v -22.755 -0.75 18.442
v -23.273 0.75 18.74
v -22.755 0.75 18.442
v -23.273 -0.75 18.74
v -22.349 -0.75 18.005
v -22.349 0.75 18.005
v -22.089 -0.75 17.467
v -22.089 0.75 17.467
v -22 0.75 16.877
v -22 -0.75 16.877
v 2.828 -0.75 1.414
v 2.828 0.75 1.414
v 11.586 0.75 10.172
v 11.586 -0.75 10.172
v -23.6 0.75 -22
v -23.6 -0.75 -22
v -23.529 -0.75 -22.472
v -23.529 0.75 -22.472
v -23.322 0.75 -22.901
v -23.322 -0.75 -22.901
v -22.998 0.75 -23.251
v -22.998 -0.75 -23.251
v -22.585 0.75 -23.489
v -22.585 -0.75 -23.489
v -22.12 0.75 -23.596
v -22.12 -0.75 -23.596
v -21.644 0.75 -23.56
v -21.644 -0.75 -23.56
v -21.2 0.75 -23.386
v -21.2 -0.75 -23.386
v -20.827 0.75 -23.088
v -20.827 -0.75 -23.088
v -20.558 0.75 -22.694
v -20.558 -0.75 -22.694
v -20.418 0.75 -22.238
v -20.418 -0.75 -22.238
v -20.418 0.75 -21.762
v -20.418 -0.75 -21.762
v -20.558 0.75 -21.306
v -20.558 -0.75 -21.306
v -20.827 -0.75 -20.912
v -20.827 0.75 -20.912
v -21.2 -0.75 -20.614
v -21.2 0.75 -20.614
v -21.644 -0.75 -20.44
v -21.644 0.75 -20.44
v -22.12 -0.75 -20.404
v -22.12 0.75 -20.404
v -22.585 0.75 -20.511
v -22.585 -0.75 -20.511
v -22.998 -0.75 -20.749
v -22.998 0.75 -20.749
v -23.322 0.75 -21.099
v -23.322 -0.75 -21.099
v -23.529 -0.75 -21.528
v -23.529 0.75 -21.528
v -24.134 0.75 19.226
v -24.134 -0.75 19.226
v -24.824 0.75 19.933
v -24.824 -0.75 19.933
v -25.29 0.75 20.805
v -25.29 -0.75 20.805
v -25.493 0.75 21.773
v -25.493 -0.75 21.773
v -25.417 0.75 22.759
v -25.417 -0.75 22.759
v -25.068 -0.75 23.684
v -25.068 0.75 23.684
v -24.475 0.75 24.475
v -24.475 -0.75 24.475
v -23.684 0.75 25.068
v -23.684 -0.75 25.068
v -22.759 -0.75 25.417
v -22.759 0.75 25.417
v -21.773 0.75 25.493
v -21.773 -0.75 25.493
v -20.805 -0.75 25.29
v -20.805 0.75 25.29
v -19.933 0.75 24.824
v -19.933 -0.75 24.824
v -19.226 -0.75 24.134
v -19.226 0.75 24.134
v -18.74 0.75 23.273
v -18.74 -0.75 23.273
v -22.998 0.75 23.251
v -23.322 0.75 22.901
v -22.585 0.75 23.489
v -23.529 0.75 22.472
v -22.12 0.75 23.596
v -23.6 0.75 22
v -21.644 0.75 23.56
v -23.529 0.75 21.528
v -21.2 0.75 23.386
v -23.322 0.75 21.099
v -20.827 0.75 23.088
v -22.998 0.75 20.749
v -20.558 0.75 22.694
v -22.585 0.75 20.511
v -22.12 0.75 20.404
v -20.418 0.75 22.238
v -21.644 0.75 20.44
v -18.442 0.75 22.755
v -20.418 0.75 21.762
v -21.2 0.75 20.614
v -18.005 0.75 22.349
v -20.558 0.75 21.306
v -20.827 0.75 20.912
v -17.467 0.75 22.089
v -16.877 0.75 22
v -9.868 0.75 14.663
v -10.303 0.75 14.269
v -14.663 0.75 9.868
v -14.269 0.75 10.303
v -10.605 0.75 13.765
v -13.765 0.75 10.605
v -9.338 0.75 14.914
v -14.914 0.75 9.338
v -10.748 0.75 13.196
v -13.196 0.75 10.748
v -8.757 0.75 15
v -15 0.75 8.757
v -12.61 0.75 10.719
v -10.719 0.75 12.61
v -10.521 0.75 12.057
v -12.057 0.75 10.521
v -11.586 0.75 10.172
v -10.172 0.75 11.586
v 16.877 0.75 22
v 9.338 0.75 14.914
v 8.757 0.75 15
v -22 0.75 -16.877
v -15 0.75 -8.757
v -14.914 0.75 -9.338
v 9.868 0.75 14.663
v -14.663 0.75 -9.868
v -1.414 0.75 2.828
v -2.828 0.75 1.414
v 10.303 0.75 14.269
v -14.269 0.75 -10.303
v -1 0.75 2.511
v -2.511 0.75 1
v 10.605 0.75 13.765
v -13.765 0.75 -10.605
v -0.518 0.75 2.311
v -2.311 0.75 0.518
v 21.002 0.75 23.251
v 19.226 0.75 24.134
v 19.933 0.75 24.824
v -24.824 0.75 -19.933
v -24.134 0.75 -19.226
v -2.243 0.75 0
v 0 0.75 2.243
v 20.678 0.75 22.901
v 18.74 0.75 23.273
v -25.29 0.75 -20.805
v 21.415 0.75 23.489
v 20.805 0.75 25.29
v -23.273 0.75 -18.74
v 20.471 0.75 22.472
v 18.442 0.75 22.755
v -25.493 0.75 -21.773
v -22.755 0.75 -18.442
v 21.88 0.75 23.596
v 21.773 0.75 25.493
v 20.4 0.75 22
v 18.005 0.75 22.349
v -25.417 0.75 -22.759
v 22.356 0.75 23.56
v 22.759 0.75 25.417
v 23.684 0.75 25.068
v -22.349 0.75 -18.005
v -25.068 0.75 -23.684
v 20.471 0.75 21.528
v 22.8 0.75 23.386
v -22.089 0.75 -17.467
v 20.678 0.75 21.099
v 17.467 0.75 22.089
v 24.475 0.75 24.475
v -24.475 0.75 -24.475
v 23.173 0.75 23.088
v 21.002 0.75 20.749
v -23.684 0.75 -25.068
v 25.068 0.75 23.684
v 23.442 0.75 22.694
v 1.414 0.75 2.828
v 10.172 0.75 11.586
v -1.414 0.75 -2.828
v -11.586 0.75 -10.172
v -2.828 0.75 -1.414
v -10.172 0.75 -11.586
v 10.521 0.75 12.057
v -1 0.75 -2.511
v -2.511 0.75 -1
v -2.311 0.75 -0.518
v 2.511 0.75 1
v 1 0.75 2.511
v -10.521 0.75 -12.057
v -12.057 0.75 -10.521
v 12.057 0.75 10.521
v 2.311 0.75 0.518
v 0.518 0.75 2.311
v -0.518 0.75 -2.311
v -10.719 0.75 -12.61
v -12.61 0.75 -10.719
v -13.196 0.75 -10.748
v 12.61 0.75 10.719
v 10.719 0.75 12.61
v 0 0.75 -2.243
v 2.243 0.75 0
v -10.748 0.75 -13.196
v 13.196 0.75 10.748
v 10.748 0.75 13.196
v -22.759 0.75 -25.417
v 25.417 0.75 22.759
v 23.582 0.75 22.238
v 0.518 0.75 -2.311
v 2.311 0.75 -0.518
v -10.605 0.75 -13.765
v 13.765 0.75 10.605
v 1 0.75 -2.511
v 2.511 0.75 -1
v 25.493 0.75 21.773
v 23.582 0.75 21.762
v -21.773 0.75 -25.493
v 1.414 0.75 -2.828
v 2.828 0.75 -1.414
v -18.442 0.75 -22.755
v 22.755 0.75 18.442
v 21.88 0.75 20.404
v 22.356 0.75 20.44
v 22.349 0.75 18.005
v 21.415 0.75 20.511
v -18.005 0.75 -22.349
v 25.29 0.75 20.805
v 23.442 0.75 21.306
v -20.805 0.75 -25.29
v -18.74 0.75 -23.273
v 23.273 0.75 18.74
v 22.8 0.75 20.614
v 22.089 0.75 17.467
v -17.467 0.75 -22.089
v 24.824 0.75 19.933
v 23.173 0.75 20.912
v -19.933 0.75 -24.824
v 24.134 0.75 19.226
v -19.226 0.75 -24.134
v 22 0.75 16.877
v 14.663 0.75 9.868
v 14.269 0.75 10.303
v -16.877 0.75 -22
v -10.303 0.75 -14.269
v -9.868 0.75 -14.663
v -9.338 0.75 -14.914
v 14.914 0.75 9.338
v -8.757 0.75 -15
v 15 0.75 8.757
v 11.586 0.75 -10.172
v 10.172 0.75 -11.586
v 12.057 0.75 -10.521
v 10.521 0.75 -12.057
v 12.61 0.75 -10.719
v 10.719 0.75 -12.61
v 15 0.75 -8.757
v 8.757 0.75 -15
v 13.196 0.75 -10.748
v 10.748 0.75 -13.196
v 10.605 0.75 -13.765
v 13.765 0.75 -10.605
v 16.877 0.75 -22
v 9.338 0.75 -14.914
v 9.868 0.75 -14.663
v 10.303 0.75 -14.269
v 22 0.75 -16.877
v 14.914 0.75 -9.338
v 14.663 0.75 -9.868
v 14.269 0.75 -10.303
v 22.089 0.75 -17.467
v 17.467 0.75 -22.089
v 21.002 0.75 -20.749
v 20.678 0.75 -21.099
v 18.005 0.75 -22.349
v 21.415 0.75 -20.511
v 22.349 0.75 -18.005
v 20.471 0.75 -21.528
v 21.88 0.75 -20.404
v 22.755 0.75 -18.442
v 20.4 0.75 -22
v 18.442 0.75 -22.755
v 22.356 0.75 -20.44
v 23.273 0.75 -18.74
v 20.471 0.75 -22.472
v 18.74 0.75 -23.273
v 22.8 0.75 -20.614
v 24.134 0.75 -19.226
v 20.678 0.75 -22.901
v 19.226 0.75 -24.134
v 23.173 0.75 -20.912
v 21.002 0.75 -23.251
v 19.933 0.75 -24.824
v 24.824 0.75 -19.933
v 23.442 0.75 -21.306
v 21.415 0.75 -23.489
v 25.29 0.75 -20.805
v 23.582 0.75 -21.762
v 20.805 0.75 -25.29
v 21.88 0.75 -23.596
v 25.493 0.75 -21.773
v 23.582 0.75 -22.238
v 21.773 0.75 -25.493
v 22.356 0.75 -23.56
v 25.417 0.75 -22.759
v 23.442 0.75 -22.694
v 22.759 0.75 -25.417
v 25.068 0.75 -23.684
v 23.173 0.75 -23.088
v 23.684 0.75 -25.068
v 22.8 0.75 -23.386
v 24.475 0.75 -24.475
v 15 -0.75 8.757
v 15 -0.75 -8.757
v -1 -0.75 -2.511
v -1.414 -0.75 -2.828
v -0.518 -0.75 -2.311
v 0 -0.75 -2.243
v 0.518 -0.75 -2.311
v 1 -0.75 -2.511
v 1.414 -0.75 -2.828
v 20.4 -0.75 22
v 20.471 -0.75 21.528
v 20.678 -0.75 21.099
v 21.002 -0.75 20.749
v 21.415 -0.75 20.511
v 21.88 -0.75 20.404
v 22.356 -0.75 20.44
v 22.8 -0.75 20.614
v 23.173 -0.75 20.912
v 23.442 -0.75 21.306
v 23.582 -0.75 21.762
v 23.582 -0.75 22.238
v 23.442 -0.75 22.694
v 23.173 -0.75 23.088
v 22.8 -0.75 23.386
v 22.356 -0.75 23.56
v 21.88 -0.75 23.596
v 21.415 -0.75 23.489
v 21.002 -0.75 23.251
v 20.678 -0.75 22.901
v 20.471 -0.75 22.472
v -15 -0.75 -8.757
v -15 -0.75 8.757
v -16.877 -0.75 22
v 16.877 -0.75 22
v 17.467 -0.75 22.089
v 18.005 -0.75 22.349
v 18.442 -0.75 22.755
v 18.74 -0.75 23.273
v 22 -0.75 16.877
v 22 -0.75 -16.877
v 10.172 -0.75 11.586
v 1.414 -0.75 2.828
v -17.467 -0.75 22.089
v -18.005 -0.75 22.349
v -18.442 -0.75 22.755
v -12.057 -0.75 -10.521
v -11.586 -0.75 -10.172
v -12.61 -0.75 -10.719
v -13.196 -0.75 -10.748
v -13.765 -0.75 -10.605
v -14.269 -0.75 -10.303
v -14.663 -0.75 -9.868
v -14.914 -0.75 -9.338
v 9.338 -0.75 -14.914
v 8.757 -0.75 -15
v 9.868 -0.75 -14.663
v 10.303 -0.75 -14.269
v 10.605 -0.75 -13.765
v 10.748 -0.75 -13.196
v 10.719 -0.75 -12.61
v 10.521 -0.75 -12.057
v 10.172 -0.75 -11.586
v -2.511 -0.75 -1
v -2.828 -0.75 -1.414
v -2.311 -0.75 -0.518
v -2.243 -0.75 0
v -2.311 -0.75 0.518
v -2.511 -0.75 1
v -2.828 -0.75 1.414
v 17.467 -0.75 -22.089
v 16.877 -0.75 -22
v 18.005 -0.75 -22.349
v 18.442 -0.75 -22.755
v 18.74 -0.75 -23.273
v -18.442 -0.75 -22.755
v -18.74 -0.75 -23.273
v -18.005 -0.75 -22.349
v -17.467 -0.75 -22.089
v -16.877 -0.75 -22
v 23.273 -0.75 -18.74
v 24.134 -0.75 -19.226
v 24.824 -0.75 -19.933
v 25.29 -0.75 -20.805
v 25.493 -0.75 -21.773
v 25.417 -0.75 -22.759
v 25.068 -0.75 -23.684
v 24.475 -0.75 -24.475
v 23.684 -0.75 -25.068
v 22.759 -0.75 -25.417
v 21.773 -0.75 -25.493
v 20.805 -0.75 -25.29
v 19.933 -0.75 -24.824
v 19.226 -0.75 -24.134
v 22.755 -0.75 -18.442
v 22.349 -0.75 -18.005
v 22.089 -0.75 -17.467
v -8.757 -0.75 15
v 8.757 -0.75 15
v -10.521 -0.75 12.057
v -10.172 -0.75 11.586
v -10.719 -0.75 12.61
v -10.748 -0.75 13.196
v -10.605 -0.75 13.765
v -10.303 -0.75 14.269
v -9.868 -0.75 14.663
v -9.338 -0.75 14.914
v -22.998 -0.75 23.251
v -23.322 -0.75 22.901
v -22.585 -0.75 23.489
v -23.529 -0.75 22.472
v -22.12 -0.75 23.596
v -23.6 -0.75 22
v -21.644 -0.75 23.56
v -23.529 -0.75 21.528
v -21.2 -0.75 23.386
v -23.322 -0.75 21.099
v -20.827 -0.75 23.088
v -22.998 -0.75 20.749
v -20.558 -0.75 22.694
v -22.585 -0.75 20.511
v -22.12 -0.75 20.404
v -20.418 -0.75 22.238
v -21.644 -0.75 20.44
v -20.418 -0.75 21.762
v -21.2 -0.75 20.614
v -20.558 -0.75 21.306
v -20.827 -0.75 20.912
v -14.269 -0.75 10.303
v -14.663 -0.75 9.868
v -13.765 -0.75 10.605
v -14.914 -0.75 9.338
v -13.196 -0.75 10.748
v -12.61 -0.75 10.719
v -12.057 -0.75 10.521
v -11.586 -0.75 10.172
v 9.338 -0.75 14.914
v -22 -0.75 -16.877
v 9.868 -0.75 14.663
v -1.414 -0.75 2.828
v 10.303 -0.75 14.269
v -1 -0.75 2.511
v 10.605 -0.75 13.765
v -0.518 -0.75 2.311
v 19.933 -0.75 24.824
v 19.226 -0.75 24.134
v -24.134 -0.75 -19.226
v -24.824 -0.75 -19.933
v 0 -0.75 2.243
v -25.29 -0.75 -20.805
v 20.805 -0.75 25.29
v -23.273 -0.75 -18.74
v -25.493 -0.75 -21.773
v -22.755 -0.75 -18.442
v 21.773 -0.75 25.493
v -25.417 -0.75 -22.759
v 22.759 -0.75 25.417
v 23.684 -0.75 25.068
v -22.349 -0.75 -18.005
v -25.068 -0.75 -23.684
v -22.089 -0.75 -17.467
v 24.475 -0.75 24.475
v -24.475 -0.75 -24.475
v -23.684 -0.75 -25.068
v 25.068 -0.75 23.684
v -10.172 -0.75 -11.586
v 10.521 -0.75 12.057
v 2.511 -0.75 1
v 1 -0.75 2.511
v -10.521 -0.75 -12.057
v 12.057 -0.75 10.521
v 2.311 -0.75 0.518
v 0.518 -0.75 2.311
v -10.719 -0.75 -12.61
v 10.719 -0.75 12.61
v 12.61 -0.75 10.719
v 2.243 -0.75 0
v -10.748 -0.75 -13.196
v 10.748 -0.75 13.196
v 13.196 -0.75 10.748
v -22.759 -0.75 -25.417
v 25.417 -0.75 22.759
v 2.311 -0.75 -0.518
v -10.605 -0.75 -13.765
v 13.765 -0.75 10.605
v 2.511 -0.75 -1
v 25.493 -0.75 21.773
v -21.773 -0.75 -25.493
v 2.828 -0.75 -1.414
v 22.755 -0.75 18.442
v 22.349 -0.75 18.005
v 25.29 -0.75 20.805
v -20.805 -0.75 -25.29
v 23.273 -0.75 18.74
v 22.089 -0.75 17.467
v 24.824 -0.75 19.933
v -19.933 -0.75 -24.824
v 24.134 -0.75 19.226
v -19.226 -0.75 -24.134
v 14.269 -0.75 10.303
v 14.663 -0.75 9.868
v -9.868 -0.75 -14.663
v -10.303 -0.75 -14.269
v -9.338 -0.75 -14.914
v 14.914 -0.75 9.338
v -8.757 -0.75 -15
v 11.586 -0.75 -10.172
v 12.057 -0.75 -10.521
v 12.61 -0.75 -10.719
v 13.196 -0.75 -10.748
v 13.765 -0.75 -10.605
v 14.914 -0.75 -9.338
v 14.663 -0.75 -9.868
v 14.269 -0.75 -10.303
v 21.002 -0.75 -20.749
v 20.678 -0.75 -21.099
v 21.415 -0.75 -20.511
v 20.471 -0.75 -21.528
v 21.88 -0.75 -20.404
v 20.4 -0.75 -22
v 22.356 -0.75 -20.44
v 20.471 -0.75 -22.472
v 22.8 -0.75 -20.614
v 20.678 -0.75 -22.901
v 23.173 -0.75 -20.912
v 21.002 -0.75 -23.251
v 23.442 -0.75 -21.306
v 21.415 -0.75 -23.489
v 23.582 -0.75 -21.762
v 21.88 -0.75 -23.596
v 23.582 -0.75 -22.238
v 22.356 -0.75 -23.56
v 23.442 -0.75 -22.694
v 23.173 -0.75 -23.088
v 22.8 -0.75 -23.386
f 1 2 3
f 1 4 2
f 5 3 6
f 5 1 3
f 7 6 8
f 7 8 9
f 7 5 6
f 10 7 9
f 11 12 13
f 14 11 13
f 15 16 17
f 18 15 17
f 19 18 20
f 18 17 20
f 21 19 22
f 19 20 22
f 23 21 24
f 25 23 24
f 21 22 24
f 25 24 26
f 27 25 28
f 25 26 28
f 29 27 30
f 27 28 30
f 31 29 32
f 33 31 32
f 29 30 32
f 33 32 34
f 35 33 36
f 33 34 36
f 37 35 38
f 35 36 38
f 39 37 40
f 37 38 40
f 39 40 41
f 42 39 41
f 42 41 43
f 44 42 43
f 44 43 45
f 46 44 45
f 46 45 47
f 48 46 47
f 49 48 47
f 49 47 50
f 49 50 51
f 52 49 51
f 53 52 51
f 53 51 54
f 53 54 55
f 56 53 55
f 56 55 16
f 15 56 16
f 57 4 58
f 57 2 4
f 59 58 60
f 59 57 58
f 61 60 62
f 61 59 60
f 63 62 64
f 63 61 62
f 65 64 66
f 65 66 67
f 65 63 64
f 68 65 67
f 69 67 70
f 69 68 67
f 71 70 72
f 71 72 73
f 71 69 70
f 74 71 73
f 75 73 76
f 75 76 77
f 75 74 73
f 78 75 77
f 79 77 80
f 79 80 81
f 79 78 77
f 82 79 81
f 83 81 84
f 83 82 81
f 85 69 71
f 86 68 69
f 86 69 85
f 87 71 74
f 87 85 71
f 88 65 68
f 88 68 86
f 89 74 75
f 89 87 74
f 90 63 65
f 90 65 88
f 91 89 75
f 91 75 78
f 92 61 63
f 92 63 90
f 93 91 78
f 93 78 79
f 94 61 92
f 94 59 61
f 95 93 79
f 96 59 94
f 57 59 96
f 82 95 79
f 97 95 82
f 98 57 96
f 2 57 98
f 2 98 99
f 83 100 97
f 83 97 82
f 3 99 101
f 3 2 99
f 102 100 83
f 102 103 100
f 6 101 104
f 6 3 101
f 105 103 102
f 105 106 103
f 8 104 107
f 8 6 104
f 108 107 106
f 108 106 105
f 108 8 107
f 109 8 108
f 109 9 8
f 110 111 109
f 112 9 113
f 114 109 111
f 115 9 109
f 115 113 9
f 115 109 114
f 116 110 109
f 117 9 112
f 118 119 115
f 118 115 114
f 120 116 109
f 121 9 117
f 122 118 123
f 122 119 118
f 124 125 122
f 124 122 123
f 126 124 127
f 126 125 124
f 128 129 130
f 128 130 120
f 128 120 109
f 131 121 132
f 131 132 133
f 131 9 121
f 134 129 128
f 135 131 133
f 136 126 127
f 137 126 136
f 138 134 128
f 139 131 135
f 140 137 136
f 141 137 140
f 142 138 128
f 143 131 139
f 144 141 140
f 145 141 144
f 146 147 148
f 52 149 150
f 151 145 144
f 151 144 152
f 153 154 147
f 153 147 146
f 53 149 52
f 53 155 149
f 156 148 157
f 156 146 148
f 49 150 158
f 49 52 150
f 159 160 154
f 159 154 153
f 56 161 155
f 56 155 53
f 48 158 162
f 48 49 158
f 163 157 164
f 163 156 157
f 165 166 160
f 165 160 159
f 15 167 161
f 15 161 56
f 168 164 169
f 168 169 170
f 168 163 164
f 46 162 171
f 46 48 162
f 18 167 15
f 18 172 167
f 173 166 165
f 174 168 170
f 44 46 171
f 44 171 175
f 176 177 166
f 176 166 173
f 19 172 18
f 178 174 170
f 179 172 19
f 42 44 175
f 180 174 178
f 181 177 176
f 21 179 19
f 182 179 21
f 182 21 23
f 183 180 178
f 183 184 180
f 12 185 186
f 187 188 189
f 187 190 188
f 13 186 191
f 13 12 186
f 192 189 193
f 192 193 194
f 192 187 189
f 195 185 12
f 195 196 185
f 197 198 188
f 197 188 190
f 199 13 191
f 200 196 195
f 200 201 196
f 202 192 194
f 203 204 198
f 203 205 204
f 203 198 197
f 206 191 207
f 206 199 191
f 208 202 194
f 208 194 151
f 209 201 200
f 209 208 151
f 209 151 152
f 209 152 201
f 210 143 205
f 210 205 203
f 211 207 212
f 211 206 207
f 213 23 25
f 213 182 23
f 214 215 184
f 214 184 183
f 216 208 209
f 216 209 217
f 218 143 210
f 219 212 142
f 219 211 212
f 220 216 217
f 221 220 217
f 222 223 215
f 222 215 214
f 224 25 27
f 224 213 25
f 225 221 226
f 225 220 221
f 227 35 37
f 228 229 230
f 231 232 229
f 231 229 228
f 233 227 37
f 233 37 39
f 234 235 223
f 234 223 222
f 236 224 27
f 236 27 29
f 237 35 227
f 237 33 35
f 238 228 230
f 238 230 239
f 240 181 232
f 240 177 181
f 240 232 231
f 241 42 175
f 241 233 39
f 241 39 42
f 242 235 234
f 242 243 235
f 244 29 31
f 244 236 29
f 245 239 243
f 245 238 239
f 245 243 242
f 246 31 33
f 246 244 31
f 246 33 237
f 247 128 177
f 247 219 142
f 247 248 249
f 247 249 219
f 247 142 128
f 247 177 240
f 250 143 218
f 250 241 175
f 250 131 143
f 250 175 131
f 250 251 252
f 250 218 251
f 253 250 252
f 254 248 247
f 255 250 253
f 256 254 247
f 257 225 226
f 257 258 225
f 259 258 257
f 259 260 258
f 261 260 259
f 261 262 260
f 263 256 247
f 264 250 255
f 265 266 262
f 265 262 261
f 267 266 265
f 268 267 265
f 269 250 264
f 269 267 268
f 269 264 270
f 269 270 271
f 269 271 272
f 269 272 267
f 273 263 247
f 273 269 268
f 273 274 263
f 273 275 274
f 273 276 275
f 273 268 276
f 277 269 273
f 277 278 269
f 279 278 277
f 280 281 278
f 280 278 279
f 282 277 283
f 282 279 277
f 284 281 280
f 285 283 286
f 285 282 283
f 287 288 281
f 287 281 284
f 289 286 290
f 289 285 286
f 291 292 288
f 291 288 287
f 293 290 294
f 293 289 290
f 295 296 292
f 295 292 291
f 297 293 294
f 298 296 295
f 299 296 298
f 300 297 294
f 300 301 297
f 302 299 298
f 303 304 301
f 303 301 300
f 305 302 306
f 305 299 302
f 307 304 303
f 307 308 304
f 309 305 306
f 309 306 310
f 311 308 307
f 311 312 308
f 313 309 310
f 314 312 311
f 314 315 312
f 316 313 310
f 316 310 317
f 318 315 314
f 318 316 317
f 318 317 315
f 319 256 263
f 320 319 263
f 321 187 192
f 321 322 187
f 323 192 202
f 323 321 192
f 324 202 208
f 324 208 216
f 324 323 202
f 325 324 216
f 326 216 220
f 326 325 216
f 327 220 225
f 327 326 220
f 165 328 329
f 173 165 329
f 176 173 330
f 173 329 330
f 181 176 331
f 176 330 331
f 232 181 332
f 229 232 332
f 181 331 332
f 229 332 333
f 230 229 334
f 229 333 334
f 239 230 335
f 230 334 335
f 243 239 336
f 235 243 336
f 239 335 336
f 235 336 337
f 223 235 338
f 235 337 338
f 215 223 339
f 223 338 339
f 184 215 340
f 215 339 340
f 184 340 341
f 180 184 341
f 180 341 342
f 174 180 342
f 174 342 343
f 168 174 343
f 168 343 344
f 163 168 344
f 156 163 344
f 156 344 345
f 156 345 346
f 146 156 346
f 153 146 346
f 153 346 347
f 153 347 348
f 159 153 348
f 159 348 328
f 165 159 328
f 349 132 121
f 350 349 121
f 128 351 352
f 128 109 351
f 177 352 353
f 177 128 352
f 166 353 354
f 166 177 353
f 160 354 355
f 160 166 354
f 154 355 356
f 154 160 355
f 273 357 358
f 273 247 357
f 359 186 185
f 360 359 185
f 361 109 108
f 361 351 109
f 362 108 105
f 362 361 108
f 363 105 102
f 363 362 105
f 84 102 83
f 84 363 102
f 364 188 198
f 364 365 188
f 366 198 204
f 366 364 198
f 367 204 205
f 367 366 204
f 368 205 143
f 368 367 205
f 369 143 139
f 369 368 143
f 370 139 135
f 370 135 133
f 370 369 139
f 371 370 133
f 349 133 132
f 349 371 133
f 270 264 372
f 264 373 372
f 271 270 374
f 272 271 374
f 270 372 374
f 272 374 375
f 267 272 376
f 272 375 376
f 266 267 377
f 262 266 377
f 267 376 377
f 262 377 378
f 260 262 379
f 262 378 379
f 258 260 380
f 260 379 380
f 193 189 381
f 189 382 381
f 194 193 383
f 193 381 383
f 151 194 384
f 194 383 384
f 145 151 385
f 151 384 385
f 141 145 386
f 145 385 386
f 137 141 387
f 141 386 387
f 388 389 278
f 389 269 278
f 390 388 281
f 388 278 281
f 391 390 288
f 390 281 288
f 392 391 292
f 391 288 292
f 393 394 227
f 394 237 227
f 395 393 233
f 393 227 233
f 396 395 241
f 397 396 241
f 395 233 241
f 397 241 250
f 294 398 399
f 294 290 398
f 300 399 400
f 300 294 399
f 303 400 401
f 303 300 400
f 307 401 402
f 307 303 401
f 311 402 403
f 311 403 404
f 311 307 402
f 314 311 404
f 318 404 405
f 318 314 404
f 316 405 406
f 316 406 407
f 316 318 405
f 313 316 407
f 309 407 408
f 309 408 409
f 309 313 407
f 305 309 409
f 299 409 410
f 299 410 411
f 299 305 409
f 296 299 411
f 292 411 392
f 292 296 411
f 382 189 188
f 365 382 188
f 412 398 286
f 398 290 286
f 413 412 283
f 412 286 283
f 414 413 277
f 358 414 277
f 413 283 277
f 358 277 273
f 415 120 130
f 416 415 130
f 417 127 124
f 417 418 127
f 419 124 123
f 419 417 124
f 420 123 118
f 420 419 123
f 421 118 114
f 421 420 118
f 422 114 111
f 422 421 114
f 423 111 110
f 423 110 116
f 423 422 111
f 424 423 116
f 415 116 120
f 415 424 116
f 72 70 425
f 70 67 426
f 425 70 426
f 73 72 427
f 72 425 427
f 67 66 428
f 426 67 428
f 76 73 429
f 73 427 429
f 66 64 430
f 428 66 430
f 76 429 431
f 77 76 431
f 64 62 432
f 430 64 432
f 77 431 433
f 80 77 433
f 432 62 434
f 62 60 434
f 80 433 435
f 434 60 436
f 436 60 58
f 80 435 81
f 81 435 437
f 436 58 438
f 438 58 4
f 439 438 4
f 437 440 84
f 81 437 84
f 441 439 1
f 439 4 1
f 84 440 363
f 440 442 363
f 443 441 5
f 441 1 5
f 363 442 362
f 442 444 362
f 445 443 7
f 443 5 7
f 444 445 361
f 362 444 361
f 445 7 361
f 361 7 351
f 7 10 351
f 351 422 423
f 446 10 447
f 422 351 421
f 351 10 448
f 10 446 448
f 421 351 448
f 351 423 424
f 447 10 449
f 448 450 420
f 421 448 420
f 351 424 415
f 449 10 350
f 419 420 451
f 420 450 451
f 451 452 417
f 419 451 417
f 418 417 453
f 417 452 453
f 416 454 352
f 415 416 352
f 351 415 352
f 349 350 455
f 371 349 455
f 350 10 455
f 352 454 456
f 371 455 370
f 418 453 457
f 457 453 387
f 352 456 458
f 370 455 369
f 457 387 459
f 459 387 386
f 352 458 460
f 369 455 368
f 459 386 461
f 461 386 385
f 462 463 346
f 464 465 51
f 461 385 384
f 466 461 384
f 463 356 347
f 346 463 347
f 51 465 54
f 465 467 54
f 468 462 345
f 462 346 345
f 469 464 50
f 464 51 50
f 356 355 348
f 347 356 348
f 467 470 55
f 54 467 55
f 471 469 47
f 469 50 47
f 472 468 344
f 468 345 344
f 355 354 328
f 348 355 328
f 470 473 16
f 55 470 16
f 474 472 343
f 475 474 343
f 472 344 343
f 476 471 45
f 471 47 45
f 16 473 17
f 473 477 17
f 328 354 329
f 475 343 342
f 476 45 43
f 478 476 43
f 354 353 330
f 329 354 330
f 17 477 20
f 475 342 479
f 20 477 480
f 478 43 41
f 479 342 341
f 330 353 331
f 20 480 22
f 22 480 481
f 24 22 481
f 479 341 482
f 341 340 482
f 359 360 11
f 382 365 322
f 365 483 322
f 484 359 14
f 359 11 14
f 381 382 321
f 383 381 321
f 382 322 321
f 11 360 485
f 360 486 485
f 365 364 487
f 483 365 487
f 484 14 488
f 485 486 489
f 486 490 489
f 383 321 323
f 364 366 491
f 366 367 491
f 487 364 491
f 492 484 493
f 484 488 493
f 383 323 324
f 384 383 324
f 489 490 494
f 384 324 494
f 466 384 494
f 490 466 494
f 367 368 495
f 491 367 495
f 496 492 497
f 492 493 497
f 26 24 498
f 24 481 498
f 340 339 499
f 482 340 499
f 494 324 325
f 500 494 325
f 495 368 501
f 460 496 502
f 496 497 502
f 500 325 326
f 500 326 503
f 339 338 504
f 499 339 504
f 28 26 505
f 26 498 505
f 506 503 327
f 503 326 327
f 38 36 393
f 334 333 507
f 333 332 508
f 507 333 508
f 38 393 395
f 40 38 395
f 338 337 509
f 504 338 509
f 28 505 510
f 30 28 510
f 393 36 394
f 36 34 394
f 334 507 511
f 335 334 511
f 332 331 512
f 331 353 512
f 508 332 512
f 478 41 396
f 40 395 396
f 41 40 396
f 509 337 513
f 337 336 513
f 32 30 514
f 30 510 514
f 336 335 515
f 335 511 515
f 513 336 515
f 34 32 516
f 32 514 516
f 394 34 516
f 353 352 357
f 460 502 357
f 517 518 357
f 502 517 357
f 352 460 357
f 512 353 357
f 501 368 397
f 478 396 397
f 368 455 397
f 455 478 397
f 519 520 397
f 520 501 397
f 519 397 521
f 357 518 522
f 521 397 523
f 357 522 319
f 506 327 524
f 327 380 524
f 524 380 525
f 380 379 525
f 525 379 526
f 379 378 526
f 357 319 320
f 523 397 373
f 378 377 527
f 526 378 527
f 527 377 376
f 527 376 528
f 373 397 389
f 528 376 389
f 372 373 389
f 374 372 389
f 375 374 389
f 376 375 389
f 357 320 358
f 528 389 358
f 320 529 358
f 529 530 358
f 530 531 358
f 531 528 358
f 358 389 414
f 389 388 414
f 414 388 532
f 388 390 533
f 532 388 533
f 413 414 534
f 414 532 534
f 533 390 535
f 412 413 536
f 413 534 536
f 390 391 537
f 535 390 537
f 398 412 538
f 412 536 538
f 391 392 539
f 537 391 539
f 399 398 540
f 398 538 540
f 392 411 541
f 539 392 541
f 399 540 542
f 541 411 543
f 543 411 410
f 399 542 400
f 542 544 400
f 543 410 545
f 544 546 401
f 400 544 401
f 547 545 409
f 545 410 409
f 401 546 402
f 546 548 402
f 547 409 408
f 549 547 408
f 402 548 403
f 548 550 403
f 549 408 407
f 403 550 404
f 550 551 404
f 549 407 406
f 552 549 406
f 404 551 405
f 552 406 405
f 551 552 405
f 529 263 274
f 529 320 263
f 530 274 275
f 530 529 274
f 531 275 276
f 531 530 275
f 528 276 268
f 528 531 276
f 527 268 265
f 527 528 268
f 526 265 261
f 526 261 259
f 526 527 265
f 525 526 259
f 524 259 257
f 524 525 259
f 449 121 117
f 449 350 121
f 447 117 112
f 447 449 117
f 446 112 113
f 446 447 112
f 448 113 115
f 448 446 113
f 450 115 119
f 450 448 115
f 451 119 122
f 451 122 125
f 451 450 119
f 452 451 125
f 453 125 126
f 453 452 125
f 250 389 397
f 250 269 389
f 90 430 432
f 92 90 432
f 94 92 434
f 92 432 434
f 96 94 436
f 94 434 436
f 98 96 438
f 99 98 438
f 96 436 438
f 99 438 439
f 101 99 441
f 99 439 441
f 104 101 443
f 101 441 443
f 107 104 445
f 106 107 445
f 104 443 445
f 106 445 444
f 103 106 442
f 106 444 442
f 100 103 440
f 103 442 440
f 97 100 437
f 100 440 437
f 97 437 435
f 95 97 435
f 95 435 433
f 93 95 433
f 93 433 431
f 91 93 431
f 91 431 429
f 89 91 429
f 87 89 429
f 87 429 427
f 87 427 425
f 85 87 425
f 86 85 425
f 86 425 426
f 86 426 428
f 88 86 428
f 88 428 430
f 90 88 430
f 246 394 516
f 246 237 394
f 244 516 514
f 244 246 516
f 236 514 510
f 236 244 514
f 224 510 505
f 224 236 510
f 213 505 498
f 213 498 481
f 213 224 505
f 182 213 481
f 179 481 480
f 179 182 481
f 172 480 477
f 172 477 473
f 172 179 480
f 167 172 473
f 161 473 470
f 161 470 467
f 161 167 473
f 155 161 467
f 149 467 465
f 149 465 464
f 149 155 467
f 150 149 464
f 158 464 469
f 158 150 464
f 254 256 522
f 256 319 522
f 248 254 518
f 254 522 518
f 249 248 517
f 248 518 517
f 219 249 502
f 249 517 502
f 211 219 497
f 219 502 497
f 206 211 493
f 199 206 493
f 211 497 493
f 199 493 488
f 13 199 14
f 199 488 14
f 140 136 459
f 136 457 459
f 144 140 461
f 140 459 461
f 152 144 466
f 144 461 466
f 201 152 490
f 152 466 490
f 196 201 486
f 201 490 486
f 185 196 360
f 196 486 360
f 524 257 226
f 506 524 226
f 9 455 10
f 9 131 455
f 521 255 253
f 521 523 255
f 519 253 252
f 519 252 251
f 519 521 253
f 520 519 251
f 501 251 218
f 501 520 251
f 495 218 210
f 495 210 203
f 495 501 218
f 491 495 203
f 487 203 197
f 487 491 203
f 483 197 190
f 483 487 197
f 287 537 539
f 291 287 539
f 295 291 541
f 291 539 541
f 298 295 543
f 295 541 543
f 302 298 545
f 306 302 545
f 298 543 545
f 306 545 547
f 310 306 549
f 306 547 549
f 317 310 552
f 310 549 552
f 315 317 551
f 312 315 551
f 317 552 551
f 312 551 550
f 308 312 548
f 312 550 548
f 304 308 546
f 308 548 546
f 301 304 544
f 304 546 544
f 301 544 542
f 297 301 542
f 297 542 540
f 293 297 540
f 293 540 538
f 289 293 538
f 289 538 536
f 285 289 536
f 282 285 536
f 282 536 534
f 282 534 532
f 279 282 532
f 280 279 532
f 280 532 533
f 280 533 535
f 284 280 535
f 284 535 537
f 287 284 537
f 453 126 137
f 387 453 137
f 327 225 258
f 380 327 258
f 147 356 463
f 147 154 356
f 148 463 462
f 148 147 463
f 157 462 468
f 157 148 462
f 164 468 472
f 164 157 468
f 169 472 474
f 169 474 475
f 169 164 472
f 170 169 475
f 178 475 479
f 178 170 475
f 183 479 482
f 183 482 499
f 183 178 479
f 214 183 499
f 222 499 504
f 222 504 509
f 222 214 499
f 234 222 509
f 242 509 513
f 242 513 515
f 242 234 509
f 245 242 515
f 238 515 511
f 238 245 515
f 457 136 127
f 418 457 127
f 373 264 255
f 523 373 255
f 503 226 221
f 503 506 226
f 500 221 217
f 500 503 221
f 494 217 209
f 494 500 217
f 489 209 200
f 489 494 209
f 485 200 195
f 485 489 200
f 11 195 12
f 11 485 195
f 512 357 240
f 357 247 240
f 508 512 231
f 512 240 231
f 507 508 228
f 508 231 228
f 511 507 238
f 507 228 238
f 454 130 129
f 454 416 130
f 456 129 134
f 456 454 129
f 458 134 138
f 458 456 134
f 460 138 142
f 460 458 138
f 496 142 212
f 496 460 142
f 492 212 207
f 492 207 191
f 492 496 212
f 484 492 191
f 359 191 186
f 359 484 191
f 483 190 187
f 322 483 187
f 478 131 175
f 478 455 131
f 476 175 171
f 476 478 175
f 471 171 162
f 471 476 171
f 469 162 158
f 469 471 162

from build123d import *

# Parameters (mm, degrees)
BOSS_EXTRUDE1_DEPTH            = 0.75
FILLET1_R                      = 2
F_3_2_3_2_DIAMETER_HOLE1_D     = 3.2
F_3_2_3_2_DIAMETER_HOLE1_DEPTH = 10
F_3_2_3_2_DIAMETER_HOLE1_TIP   = 0.96137699
CUT_EXTRUDE1_DEPTH             = 1.5
FILLET2_R                      = 2


with BuildPart() as part:
    # Sketch1 → Boss-Extrude1 (new body, symmetric)
    with BuildSketch(Plane(origin=(0, 0, 0), x_dir=(1, 0, 0), z_dir=(0, 1, 0))):
        with BuildLine():
            Line((-18.5, -22), (18.5, -22))
            ThreePointArc((18.5, -22), (24.474873734, -24.474873734), (22, -18.5))
            Line((22, -18.5), (22, 18.5))
            ThreePointArc((22, 18.5), (24.474873734, 24.474873734), (18.5, 22))
            Line((18.5, 22), (-18.5, 22))
            ThreePointArc((-18.5, 22), (-24.474873734, 24.474873734), (-22, 18.5))
            Line((-22, 18.5), (-22, -18.5))
            ThreePointArc((-22, -18.5), (-24.474873734, -24.474873734), (-18.5, -22))
        make_face()
    extrude(amount=BOSS_EXTRUDE1_DEPTH, both=True)

    # Fillet1
    fillet1_edges = [part.edges().sort_by_distance(p)[0] for p in [
        (-18.5, 0, -22),
        (18.5, 0, -22),
        (22, 0, -18.5),
        (22, 0, 18.5),
        (18.5, 0, 22),
        (-18.5, 0, 22),
        (-22, 0, 18.5),
        (-22, 0, -18.5),
    ]]
    fillet(fillet1_edges, radius=FILLET1_R)

    # Ø3.2 (3.2) Diameter Hole1
    with Locations(Plane(origin=(0, 0.75, 0), x_dir=(1, 0, 0), z_dir=(0, 1, 0))):
        with Locations((-22, 22), (-22, -22), (22, -22), (22, 22)):
            Hole(F_3_2_3_2_DIAMETER_HOLE1_D / 2, depth=F_3_2_3_2_DIAMETER_HOLE1_DEPTH)
            with Locations((0, 0, -(F_3_2_3_2_DIAMETER_HOLE1_DEPTH + F_3_2_3_2_DIAMETER_HOLE1_TIP / 2))):  # 118° drill point
                Cone(0, F_3_2_3_2_DIAMETER_HOLE1_D / 2, F_3_2_3_2_DIAMETER_HOLE1_TIP, mode=Mode.SUBTRACT)

    # Sketch4 → Cut-Extrude1 (cut)
    with BuildSketch(Plane(origin=(0, 0.75, 0), x_dir=(1, 0, 0), z_dir=(0, 1, 0))):
        Polygon((-1.414213562, 0), (-15, 13.585786438), (-15, -13.585786438), align=None)
        Polygon((13.585786438, 15), (-13.585786438, 15), (0, 1.414213562), align=None)
        Polygon((15, -13.585786438), (15, 13.585786438), (1.414213562, 0), align=None)
        Polygon((0, -1.414213562), (-13.585786438, -15), (13.585786438, -15), align=None)
    extrude(amount=-CUT_EXTRUDE1_DEPTH, mode=Mode.SUBTRACT)

    # Fillet2
    fillet2_edges = [part.edges().sort_by_distance(p)[0] for p in [
        (-1.414213562, 0, 0),
        (-15, 0, 13.585786438),
        (-15, 0, -13.585786438),
        (13.585786438, 0, -15),
        (0, 0, -1.414213562),
        (-13.585786438, 0, -15),
        (15, 0, -13.585786438),
        (15, 0, 13.585786438),
        (1.414213562, 0, 0),
        (0, 0, 1.414213562),
        (13.585786438, 0, 15),
        (-13.585786438, 0, 15),
    ]]
    fillet(fillet2_edges, radius=FILLET2_R)


solid = part.part
